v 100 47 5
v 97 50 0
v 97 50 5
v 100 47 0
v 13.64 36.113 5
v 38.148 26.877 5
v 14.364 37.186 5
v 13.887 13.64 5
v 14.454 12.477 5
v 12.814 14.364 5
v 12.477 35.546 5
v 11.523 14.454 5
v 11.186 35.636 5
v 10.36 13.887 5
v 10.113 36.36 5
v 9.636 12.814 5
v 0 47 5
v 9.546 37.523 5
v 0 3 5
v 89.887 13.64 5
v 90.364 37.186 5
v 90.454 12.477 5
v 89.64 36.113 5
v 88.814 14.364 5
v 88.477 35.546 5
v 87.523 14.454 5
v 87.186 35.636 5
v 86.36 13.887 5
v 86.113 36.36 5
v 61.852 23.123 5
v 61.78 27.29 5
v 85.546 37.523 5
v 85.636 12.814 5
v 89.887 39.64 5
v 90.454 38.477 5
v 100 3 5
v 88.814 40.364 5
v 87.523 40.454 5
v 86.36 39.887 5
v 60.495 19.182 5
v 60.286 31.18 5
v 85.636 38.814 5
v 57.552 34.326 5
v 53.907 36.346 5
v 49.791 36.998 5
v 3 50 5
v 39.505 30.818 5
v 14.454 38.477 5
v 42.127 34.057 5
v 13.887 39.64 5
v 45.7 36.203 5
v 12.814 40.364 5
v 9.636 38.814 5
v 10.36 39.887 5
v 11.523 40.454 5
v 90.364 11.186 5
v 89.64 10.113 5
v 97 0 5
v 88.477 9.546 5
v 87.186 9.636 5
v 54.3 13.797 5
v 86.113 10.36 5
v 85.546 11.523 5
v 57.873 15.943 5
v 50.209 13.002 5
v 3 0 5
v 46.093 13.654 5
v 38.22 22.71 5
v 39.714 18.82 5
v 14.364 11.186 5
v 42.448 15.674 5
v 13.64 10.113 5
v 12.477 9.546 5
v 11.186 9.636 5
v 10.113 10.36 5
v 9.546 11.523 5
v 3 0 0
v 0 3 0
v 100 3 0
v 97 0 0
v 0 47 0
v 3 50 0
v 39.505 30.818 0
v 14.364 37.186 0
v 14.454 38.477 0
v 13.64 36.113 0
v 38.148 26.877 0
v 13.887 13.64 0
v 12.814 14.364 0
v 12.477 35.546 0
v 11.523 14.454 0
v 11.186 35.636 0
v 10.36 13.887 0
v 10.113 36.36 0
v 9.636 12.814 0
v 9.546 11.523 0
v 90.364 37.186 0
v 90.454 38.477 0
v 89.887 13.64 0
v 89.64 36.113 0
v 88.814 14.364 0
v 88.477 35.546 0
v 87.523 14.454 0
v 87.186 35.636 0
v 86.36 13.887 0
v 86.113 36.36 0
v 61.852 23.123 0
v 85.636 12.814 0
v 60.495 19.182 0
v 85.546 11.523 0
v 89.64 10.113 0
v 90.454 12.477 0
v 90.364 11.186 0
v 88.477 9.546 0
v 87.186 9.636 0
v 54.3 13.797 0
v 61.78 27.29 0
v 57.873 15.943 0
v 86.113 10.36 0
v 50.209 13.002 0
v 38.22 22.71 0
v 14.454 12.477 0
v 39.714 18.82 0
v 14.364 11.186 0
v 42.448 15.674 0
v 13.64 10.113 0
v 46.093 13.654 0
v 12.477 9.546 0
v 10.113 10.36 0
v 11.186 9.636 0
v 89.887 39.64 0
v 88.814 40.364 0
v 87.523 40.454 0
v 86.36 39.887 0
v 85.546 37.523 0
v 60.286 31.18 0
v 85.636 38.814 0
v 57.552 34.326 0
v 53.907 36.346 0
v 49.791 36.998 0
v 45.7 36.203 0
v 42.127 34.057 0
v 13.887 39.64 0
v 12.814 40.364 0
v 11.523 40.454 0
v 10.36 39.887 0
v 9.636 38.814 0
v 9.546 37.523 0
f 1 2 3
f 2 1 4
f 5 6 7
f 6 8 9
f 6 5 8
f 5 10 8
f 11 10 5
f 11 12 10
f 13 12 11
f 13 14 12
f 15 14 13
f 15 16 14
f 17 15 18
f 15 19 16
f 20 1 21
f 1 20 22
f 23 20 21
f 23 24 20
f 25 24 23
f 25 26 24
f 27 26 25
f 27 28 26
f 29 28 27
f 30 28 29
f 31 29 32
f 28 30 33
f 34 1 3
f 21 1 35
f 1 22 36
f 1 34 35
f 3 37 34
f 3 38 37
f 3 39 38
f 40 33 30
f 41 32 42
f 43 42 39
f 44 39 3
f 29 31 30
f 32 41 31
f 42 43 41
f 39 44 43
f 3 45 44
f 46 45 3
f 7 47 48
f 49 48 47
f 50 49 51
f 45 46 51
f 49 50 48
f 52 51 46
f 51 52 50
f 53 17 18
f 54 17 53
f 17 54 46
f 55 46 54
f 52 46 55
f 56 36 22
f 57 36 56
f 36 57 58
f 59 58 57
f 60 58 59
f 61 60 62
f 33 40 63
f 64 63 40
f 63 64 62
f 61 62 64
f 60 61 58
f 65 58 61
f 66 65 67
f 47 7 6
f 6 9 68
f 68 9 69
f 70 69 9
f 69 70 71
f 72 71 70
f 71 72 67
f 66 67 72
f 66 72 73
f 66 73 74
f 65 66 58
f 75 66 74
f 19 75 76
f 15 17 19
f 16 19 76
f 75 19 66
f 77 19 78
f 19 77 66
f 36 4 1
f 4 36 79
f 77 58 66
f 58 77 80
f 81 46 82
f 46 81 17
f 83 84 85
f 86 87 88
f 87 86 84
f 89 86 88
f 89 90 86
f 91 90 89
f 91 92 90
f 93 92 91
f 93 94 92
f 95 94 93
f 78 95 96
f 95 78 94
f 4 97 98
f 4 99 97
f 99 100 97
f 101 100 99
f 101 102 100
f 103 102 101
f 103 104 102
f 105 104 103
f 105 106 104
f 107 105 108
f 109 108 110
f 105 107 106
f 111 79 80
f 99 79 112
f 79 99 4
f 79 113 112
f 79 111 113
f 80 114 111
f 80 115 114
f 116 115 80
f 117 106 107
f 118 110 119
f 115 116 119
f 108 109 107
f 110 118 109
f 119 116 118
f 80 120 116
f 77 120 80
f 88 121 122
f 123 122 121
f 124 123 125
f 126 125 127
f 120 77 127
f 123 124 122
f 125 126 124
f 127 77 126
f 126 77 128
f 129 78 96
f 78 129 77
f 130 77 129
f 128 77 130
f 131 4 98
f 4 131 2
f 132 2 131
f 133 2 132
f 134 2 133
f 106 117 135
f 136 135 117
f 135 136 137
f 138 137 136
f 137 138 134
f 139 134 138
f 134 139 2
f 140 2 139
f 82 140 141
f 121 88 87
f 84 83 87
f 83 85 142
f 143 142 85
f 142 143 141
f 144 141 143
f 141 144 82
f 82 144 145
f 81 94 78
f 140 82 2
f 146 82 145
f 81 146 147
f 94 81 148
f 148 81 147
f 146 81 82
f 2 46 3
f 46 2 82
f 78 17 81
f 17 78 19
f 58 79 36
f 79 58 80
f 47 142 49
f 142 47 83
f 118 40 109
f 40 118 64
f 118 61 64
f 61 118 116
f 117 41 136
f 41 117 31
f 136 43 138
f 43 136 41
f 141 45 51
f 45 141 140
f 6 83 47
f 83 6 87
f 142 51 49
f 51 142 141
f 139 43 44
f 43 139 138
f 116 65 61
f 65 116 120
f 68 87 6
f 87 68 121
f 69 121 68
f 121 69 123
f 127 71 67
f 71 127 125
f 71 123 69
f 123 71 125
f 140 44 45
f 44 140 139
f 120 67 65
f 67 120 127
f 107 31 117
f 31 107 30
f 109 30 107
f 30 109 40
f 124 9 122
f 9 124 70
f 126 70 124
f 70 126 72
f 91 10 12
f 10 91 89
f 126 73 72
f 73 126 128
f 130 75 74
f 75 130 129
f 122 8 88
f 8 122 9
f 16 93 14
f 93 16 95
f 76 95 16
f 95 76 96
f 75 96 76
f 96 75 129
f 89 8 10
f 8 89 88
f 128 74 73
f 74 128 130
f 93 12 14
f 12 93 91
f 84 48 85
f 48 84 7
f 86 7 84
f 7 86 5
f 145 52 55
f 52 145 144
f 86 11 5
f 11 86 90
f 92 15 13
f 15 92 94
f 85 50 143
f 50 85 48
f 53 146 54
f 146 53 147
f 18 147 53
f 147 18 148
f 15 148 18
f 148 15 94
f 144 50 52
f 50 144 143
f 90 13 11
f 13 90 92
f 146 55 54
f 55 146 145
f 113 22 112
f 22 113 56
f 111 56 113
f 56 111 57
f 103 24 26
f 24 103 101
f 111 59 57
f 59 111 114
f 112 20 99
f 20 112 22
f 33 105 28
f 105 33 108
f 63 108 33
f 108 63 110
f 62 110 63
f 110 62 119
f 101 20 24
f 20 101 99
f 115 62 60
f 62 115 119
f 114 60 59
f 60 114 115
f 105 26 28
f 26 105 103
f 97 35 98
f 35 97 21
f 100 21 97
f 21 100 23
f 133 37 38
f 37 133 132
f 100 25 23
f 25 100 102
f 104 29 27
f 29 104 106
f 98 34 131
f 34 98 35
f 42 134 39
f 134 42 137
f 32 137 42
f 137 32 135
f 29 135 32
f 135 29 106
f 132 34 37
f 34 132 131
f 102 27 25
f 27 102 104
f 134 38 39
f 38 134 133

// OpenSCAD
$fn = 32;

// ----------------------------------------------------------------------
// Spacer plate: rect 100 x 50
// ----------------------------------------------------------------------

// --- parameters (mm) ---
bore_r = 12;              // centre bore radius
bolt_r = 2.5;             // bolt hole radius
plate_t = 5;              // plate thickness, Z (extrusion height)
plate_l = 100;            // plate length, X
plate_w = 50;             // plate width, Y
inset = 12;               // corner hole inset

profile = [[3, 0], [97, 0], [100, 3], [100, 47], [97, 50], [3, 50], [0, 47], [0, 3]];  // primary outline, 8 points, counter clockwise
void_1 = [[61.78, 27.29], [60.286, 31.18], [57.552, 34.326], [53.907, 36.346], [49.791, 36.998], [45.7, 36.203], [42.127, 34.057], [39.505, 30.818], [38.148, 26.877], [38.22, 22.71], [39.714, 18.82], [42.448, 15.674], [46.093, 13.654], [50.209, 13.002], [54.3, 13.797], [57.873, 15.943], [60.495, 19.182], [61.852, 23.123]];  // centre bore, 18 points
void_2 = [[14.454, 12.477], [13.887, 13.64], [12.814, 14.364], [11.523, 14.454], [10.36, 13.887], [9.636, 12.814], [9.546, 11.523], [10.113, 10.36], [11.186, 9.636], [12.477, 9.546], [13.64, 10.113], [14.364, 11.186]];  // corner hole, 12 points
void_3 = [[14.454, 38.477], [13.887, 39.64], [12.814, 40.364], [11.523, 40.454], [10.36, 39.887], [9.636, 38.814], [9.546, 37.523], [10.113, 36.36], [11.186, 35.636], [12.477, 35.546], [13.64, 36.113], [14.364, 37.186]];  // corner hole, 12 points
void_4 = [[90.454, 12.477], [89.887, 13.64], [88.814, 14.364], [87.523, 14.454], [86.36, 13.887], [85.636, 12.814], [85.546, 11.523], [86.113, 10.36], [87.186, 9.636], [88.477, 9.546], [89.64, 10.113], [90.364, 11.186]];  // corner hole, 12 points
void_5 = [[90.454, 38.477], [89.887, 39.64], [88.814, 40.364], [87.523, 40.454], [86.36, 39.887], [85.636, 38.814], [85.546, 37.523], [86.113, 36.36], [87.186, 35.636], [88.477, 35.546], [89.64, 36.113], [90.364, 37.186]];  // corner hole, 12 points

// --- the one profile operation ---
difference() {
  linear_extrude(height = plate_t) polygon(points = profile);
  translate([0, 0, -1])
    linear_extrude(height = plate_t + 2) polygon(points = void_1);
  translate([0, 0, -1])
    linear_extrude(height = plate_t + 2) polygon(points = void_2);
  translate([0, 0, -1])
    linear_extrude(height = plate_t + 2) polygon(points = void_3);
  translate([0, 0, -1])
    linear_extrude(height = plate_t + 2) polygon(points = void_4);
  translate([0, 0, -1])
    linear_extrude(height = plate_t + 2) polygon(points = void_5);
}
